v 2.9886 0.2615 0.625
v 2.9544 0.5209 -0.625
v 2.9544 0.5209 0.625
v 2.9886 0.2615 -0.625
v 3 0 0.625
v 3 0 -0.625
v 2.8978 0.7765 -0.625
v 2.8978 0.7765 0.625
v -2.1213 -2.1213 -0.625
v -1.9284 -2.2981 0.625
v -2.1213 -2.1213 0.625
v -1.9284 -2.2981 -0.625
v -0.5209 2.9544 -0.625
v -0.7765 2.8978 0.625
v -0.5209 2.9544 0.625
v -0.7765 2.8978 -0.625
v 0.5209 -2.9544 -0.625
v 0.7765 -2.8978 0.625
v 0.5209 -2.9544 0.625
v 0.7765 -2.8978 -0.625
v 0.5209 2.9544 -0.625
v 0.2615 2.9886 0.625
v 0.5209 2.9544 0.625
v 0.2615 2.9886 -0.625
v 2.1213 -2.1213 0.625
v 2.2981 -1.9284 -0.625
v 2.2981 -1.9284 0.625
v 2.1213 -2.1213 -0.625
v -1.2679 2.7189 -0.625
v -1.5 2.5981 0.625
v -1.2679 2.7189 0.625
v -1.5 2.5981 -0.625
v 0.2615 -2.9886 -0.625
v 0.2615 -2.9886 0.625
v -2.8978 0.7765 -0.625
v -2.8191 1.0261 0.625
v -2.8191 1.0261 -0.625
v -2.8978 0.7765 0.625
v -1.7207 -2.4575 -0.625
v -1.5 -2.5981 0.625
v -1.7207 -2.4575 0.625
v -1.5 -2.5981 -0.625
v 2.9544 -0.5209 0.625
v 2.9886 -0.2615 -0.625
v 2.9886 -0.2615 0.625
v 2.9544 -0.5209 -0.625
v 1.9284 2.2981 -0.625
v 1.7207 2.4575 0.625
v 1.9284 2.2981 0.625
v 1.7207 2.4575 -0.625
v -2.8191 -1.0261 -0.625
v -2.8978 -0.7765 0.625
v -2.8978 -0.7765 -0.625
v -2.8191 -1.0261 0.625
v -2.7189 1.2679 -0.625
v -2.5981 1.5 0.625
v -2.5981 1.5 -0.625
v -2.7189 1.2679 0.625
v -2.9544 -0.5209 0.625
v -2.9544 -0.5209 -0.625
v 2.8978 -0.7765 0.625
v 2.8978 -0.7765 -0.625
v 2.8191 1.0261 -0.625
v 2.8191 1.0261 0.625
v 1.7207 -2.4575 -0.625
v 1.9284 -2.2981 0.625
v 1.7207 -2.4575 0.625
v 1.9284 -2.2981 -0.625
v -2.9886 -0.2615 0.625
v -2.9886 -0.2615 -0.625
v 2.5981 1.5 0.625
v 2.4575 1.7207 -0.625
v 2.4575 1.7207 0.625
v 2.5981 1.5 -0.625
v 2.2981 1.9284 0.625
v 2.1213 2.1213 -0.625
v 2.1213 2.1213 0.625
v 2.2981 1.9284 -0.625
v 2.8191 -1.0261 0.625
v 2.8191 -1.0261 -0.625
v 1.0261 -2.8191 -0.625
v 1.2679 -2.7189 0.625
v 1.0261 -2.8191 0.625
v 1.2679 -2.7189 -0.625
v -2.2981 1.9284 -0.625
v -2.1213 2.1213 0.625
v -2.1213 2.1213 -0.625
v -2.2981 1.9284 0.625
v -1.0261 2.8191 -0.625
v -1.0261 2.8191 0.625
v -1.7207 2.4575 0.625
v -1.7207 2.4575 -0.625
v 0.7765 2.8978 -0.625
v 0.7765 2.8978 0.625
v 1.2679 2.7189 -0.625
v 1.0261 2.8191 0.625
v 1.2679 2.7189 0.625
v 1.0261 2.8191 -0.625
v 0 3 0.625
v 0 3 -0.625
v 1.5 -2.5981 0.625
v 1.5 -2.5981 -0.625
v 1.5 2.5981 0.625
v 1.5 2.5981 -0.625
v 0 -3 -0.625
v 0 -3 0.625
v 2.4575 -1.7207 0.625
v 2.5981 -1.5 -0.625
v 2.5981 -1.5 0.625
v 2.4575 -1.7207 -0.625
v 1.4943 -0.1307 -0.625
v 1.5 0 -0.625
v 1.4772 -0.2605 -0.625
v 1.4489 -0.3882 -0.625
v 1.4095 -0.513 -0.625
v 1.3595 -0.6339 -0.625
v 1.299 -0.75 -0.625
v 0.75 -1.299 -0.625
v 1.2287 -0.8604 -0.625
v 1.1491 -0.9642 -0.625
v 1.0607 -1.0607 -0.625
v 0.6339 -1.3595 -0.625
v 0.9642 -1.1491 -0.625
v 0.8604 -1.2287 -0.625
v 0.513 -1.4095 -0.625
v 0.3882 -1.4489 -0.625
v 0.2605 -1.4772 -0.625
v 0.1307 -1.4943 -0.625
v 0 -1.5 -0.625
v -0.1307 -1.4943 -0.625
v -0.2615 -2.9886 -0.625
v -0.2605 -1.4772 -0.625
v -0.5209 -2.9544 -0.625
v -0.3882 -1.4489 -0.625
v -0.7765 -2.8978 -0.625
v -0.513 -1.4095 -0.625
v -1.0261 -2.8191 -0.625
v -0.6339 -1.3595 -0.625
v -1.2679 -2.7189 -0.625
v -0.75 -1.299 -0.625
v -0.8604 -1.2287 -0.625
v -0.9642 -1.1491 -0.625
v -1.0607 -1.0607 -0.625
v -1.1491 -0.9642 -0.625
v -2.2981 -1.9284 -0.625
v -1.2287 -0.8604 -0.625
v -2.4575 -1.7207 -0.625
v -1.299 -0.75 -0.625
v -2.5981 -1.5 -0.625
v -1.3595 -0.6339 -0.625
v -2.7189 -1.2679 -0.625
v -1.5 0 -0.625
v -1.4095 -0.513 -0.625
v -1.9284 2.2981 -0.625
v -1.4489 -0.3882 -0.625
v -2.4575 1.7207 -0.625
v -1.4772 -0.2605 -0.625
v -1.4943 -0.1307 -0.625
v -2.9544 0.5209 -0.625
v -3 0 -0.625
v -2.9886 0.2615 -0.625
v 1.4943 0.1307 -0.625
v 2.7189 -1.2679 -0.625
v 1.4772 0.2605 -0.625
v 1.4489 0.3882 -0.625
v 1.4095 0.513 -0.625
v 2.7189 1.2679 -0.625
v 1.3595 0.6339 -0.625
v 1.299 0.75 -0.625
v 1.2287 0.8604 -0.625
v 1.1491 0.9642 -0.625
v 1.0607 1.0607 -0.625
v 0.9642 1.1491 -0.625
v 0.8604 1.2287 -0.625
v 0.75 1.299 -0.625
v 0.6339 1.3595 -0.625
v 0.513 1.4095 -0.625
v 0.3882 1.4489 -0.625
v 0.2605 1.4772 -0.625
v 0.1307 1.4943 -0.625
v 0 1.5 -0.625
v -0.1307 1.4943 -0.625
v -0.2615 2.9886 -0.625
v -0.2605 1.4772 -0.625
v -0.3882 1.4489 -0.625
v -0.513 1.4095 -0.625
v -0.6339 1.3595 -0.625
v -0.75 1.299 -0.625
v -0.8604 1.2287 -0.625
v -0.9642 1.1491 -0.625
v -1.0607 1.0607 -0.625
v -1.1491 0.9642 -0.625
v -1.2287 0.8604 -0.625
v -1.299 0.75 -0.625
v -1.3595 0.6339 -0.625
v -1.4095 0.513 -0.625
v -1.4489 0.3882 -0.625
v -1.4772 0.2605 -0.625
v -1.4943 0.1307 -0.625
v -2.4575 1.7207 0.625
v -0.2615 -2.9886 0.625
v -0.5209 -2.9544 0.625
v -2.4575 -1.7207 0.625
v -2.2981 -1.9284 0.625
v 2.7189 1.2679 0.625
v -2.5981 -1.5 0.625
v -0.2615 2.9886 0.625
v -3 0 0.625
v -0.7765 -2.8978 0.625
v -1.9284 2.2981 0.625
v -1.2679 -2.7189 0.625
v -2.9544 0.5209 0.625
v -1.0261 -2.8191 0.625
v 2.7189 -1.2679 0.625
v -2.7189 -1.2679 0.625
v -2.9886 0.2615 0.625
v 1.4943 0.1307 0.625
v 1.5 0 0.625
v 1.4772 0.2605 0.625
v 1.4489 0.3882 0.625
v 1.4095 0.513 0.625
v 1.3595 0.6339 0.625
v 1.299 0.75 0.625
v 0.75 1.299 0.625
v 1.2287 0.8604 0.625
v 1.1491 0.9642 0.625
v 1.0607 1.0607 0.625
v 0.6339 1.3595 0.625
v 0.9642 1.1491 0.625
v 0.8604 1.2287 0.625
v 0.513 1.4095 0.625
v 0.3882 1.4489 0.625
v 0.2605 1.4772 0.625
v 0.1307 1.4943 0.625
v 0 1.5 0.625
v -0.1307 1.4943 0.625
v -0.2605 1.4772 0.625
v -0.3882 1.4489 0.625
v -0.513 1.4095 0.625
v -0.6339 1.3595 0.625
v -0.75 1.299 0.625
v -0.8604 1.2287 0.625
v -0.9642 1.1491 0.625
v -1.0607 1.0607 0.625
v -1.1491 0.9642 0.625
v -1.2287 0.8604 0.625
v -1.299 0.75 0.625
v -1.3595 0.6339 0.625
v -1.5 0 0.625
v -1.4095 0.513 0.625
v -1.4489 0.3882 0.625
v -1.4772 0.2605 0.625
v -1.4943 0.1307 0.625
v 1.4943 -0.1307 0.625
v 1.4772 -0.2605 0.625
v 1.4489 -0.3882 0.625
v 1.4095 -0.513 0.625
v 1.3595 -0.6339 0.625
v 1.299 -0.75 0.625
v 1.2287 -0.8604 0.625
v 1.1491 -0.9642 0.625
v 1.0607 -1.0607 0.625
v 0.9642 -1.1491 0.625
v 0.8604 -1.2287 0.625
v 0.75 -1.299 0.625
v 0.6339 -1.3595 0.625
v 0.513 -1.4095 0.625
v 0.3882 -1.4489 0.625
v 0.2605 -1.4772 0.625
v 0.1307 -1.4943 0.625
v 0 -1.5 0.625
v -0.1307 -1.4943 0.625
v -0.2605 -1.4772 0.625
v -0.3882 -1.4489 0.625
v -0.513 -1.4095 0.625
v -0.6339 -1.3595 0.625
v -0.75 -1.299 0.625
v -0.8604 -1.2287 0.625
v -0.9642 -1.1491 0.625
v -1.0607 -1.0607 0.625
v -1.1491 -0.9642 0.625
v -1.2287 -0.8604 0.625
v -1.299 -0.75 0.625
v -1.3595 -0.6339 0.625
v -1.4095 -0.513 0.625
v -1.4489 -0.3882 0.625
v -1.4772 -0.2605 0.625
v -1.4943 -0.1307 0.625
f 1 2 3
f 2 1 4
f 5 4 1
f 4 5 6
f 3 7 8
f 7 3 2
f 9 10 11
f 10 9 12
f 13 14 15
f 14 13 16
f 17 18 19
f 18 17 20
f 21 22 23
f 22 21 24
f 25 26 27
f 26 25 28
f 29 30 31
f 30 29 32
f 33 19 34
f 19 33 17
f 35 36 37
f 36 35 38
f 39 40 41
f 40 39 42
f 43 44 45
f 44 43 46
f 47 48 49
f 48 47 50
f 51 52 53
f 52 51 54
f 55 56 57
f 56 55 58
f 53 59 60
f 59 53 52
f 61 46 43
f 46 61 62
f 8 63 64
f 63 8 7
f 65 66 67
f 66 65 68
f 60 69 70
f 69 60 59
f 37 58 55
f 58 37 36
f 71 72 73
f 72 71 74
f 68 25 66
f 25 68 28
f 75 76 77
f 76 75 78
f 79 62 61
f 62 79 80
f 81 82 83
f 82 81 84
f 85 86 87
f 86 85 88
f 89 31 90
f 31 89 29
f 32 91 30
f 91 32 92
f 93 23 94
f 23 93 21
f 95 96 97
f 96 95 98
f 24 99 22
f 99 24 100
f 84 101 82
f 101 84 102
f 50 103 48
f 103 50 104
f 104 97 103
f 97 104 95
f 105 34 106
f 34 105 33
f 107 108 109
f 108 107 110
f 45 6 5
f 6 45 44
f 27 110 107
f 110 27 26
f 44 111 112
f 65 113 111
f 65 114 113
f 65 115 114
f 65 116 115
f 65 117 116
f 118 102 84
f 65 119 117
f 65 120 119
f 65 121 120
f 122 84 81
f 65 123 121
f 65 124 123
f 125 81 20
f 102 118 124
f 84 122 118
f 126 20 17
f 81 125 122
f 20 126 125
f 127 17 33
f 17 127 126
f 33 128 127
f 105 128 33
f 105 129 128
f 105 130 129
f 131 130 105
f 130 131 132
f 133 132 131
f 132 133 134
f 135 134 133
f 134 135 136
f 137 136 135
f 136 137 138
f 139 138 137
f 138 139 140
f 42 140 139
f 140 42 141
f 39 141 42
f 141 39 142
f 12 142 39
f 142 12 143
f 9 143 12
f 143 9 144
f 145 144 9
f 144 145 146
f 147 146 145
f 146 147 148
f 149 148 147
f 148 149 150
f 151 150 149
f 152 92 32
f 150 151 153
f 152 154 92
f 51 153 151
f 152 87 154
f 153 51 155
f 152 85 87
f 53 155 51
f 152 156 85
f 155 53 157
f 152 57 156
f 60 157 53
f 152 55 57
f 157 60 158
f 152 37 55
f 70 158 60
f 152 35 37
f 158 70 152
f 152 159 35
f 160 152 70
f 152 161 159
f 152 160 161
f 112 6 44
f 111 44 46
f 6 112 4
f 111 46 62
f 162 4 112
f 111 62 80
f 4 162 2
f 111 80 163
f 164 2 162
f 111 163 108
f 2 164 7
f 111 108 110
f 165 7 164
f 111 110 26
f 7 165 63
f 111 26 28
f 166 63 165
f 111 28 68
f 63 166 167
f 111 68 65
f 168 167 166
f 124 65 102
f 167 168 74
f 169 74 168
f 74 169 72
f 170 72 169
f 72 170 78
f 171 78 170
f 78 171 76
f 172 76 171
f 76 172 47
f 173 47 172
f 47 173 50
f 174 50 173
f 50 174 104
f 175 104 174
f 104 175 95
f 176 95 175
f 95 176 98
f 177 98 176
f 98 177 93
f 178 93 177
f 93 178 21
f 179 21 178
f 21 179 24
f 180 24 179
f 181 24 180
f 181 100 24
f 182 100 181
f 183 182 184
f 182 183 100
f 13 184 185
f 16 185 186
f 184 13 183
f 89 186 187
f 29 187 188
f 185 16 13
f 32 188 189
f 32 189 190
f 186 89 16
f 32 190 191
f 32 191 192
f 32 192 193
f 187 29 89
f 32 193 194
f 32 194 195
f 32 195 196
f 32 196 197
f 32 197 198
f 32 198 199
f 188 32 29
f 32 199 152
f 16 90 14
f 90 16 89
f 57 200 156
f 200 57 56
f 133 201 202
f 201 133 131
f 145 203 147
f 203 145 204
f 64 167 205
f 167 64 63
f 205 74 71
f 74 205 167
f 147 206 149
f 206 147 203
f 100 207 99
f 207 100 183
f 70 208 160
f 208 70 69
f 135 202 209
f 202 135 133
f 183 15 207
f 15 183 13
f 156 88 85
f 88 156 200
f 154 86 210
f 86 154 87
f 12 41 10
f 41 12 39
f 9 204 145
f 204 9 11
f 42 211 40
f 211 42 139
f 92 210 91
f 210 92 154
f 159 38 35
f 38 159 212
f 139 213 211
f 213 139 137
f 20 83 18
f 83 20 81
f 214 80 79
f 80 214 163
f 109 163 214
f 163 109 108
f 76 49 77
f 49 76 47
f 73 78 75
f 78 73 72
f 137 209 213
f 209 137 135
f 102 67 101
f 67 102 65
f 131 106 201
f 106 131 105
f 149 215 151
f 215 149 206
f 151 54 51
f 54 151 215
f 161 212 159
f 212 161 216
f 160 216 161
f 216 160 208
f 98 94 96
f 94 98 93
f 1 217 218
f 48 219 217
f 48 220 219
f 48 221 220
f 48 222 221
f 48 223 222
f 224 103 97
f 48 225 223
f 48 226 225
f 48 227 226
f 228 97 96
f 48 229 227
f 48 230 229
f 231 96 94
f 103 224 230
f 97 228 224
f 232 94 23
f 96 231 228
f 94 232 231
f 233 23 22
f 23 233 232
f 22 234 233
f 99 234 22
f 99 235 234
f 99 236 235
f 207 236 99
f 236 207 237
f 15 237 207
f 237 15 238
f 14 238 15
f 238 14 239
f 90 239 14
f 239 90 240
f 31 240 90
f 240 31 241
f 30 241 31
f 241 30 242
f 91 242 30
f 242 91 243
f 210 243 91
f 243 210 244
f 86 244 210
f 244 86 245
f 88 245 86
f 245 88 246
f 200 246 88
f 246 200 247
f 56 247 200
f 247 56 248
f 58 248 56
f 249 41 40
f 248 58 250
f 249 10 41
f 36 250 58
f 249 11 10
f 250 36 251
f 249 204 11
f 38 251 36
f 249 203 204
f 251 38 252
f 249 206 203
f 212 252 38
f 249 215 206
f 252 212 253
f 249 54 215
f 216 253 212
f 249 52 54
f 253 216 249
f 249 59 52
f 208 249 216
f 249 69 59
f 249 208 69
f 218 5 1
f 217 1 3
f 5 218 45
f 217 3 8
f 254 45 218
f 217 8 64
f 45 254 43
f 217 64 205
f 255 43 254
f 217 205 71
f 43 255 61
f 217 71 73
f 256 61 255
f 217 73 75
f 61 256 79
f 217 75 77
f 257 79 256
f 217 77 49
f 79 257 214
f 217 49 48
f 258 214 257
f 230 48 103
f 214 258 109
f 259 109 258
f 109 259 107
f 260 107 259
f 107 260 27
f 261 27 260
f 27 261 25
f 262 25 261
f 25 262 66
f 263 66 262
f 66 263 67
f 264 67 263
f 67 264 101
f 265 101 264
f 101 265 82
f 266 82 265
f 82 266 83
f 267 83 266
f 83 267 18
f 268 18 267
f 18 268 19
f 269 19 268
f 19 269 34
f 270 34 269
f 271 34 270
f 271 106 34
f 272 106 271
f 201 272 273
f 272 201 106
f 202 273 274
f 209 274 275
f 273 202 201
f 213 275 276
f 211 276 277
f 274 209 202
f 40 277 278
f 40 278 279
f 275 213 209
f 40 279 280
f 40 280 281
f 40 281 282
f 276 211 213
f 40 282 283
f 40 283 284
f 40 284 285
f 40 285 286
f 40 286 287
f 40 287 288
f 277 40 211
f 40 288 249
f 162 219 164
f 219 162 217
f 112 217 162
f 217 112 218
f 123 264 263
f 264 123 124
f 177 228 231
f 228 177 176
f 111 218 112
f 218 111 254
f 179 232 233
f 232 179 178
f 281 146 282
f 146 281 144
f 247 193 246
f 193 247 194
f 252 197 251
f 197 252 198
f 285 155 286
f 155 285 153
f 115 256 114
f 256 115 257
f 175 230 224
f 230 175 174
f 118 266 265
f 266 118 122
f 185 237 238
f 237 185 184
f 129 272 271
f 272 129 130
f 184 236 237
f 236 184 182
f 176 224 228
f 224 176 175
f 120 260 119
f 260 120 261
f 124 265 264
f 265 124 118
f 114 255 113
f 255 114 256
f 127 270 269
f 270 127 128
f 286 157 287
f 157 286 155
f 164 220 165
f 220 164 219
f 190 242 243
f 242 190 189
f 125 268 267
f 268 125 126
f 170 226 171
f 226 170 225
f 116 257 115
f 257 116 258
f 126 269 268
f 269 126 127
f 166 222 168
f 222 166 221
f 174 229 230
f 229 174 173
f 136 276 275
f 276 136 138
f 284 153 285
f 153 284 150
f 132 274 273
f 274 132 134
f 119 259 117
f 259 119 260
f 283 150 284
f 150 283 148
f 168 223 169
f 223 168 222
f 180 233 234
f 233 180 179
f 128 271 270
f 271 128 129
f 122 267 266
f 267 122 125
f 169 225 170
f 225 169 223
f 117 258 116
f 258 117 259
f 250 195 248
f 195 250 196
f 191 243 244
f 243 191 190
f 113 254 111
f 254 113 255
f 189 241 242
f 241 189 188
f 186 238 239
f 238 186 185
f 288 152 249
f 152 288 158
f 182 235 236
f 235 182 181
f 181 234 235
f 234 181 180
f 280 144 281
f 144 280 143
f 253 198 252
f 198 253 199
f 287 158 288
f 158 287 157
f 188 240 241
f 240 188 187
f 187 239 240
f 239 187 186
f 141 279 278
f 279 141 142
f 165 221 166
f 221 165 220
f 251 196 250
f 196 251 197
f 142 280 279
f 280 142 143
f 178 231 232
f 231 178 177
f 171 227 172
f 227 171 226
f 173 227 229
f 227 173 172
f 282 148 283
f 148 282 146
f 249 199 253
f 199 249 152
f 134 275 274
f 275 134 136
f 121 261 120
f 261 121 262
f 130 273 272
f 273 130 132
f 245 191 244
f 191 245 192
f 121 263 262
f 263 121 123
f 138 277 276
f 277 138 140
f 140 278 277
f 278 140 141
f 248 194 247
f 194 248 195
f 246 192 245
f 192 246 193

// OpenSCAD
module example001()
{
	function r_from_dia(d) = d / 2;

	module rotcy(rot, r, h) {
		rotate(90, rot)
			cylinder(r = r, h = h, center = true);
	}

	difference() {
		rotcy([0, 0, 0], cy_r, cy_h, $fa=5, $fs=0.1);
		rotcy([0, 0, 0], 1.5, cy_h+1, $fa=5, $fs=0.1);
	}

	size = 1;
	hole = 6;

	cy_r = r_from_dia(hole);
	cy_h = r_from_dia(size * 2.5);
}

example001();
